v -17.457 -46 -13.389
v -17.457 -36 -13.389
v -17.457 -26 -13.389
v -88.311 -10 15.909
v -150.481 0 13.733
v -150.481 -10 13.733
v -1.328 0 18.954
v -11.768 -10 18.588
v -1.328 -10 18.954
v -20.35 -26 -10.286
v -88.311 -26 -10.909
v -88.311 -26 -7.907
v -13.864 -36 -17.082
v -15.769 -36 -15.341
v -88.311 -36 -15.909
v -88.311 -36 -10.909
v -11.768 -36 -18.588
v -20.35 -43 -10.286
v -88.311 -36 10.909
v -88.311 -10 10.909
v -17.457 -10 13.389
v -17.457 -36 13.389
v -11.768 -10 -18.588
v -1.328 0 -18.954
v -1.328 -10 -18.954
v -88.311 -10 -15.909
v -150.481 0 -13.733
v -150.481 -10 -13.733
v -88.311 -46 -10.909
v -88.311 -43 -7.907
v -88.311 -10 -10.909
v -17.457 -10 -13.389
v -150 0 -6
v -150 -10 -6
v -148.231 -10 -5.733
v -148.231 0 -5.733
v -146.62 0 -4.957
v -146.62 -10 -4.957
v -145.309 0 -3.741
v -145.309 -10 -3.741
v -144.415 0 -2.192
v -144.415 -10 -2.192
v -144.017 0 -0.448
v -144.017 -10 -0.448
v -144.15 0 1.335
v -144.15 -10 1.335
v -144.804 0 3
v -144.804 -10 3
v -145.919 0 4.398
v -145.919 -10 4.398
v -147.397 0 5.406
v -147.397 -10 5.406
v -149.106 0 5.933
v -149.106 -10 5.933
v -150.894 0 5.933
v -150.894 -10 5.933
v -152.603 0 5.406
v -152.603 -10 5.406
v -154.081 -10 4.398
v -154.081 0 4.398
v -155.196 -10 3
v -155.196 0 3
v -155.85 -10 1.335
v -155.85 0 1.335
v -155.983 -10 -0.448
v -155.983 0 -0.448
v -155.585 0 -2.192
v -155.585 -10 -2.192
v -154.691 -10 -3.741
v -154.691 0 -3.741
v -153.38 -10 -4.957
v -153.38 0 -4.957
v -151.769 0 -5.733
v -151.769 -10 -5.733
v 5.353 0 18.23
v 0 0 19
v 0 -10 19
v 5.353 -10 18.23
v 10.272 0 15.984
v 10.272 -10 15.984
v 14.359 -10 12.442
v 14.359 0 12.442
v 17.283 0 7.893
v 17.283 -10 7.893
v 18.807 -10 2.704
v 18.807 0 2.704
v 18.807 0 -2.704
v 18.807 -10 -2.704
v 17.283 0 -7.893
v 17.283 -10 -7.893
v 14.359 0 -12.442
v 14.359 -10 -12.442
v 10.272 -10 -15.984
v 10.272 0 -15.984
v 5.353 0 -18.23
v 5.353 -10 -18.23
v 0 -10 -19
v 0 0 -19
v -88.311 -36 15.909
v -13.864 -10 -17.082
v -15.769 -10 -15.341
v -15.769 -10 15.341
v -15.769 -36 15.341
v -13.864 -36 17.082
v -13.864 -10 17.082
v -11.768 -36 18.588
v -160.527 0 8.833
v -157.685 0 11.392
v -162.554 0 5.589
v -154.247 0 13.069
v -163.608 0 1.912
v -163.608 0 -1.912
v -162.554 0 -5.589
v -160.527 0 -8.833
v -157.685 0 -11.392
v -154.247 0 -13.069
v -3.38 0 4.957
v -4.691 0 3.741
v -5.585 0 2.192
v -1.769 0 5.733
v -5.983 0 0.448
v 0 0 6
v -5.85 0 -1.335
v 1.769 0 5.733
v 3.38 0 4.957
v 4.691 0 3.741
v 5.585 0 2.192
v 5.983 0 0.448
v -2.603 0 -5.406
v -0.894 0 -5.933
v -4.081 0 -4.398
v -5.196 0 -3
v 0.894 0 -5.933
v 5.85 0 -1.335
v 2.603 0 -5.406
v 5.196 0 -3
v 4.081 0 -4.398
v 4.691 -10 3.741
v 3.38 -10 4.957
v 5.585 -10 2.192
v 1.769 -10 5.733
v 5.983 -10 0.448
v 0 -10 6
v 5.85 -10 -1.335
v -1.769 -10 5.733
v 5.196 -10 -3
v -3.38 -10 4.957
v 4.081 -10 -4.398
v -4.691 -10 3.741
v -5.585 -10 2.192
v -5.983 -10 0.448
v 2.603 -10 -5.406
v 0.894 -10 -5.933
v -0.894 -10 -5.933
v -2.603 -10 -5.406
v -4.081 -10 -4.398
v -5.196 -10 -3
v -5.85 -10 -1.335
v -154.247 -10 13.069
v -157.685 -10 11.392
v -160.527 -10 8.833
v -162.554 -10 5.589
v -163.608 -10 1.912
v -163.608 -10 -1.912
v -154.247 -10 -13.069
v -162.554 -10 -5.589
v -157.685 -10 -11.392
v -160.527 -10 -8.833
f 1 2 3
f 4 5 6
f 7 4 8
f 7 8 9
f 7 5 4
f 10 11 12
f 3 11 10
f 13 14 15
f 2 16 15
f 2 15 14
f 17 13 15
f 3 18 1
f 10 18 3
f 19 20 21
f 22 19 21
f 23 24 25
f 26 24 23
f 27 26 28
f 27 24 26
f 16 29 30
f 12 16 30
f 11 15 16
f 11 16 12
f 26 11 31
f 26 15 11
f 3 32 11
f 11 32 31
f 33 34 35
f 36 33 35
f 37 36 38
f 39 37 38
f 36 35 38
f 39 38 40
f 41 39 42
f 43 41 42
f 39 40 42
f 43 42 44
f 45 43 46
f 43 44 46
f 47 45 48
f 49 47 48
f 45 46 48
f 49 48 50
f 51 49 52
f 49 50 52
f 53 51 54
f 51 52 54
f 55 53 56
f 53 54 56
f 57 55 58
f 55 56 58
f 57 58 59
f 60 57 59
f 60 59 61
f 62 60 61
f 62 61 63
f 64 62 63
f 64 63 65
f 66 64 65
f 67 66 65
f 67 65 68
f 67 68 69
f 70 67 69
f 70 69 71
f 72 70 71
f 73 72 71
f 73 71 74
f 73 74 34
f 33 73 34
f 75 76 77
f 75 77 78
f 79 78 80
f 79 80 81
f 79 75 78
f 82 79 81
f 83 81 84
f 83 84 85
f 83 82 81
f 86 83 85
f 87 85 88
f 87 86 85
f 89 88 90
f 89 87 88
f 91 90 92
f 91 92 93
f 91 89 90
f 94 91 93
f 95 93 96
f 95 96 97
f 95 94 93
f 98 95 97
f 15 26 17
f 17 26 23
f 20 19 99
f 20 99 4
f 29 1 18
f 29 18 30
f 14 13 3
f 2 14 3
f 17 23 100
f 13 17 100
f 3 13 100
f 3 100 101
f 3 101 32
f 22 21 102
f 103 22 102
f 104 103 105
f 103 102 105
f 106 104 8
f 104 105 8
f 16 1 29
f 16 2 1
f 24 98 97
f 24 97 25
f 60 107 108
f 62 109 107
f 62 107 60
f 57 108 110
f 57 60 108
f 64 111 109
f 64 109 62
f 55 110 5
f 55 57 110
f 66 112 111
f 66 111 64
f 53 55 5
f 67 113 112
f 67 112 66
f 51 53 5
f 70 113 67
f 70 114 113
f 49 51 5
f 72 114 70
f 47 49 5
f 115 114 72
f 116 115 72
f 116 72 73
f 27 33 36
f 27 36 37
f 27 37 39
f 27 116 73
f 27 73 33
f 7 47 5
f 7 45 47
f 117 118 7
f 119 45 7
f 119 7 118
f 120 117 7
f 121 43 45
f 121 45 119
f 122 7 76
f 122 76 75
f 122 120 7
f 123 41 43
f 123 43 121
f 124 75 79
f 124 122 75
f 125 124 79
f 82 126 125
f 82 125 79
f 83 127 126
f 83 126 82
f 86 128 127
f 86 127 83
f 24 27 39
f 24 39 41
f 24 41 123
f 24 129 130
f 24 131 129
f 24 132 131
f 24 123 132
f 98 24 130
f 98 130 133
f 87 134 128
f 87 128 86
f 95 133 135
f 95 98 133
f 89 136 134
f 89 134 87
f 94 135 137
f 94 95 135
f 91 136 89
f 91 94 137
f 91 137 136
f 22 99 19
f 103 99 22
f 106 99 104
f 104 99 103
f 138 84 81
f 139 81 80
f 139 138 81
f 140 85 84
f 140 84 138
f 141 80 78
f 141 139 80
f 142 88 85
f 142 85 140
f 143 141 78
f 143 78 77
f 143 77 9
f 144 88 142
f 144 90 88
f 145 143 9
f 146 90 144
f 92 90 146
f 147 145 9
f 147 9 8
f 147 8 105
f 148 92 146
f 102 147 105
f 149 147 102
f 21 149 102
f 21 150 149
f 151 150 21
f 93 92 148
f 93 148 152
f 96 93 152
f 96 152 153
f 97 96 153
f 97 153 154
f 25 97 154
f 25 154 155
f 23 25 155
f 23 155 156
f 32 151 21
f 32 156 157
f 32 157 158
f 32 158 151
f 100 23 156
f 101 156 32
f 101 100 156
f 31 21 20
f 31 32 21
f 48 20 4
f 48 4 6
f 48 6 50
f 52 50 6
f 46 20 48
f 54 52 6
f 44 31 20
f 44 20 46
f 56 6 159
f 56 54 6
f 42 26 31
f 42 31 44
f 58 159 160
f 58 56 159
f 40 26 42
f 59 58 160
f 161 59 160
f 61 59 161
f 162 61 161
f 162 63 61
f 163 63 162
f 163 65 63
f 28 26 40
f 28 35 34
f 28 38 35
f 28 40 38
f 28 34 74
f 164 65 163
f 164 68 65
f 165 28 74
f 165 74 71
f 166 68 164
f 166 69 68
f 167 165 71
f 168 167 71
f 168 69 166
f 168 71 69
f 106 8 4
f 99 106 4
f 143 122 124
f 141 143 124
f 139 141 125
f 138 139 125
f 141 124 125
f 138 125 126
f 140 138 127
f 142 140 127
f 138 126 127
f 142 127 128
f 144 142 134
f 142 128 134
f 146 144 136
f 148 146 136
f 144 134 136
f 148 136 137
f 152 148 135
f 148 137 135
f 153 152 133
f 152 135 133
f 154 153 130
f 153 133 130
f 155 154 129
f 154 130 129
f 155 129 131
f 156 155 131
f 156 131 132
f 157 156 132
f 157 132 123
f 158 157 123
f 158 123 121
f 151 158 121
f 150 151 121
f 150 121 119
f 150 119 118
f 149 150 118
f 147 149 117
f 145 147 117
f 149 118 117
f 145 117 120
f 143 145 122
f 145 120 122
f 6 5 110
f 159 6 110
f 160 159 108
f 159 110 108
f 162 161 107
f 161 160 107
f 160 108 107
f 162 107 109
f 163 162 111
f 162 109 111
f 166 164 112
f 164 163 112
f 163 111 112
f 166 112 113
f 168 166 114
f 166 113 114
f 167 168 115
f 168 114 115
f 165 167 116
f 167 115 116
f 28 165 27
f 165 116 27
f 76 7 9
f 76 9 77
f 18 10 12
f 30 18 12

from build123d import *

# Parameters (mm, degrees)
SKETCH1_R               = 12
SKETCH1_R_2             = 6
BOSS_EXTRUDE1_DEPTH     = 10
SKETCH2_R               = 6
SKETCH2_R_2             = 12
BOSS_EXTRUDE3_DEPTH     = 10
BOSS_EXTRUDE4_DEPTH     = 26
CUT_EXTRUDE3_START      = -41
CUT_EXTRUDE3_DEPTH      = 41
CUT_EXTRUDE4_REACH      = 168.878
SKETCH7_R               = 6
SKETCH8_R               = 22
CUT_EXTRUDE5_DEPTH      = 26
BOSS_EXTRUDE5_DEPTH     = 3
CHAMFER1_SIZE           = 3
CUT_EXTRUDE7_DEPTH      = 172.13826848
CUT_EXTRUDE7_DEPTH_BACK = 172.13826848
SKETCH12_W              = 45
SKETCH12_H              = 36


with BuildPart() as part:
    # Sketch1 → Boss-Extrude1 (new body)
    with BuildSketch(Plane(origin=(0, 0, 0), x_dir=(1, 0, 0), z_dir=(0, 1, 0))):
        with Locations(Location((0, 0, 0), (0, 0, 270))):
            Circle(SKETCH1_R)
        with Locations(Location((0, 0, 0), (0, 0, 270))):
            Circle(SKETCH1_R_2, mode=Mode.SUBTRACT)
    extrude(amount=-BOSS_EXTRUDE1_DEPTH)

    # Sketch2 → Boss-Extrude3 (add)
    with BuildSketch(Plane(origin=(0, 0, 0), x_dir=(1, 0, 0), z_dir=(0, 1, 0))):
        with BuildLine():
            Line((-1.328372743, 18.953506954), (-200, 12))
            ThreePointArc((-200, 12), (-212, 0), (-200, -12))
            Line((-200, -12), (-1.328372743, -18.953506954))
            Line((-1.328372743, -18.953506954), (0, -19))
            ThreePointArc((0, -19), (19, 0), (0, 19))
            Line((0, 19), (-1.328372743, 18.953506954))
        make_face()
        with Locations(Location((-200, 0, 0), (0, 0, 270))):
            Circle(SKETCH2_R, mode=Mode.SUBTRACT)
        Circle(SKETCH2_R_2, mode=Mode.SUBTRACT)
    extrude(amount=-BOSS_EXTRUDE3_DEPTH)

    # Sketch3 → Boss-Extrude4 (add)
    with BuildSketch(Plane.XZ.offset(10)):
        with BuildLine():
            Line((-191.415216863, -12.30046741), (-11.76781879, -18.588126342))
            ThreePointArc((-11.76781879, -18.588126342), (-14.841660941, -16.239615159), (-17.45663787, -13.389017675))
            Line((-17.45663787, -13.389017675), (-186.984061419, -7.45555785))
            ThreePointArc((-186.984061419, -7.45555785), (-188.93130171, -10.123434109), (-191.415216863, -12.30046741))
        make_face()
        with BuildLine():
            Line((-186.984061419, 7.45555785), (-17.45663787, 13.389017675))
            ThreePointArc((-17.45663787, 13.389017675), (-14.841660941, 16.239615159), (-11.76781879, 18.588126342))
            Line((-11.76781879, 18.588126342), (-191.415216863, 12.30046741))
            ThreePointArc((-191.415216863, 12.30046741), (-188.93130171, 10.123434109), (-186.984061419, 7.45555785))
        make_face()
    extrude(amount=BOSS_EXTRUDE4_DEPTH)

    # Sketch6 → Cut-Extrude3 (cut)
    with BuildSketch(Plane.XZ.offset(36).offset(CUT_EXTRUDE3_START)):
        with BuildLine():
            Line((-200, 12), (-191.415216863, 12.30046741))
            Line((-191.415216863, 12.30046741), (-150.48066119, 13.733176858))
            ThreePointArc((-150.48066119, 13.733176858), (-163.741585855, 0), (-150.48066119, -13.733176858))
            Line((-150.48066119, -13.733176858), (-191.415216863, -12.30046741))
            Line((-191.415216863, -12.30046741), (-200, -12))
            ThreePointArc((-200, -12), (-212, 0), (-200, 12))
        make_face()
    extrude(amount=CUT_EXTRUDE3_DEPTH, mode=Mode.SUBTRACT)

    # Sketch7 → Cut-Extrude4 (cut, up to next)
    with BuildSketch(Plane.XZ.offset(10), mode=Mode.PRIVATE) as cut_extrude4_sk1:
        with Locations(Location((-150, 0, 0), (0, 0, 270))):
            Circle(SKETCH7_R)
    cut_extrude4_tool1 = extrude(cut_extrude4_sk1.sketch, amount=-CUT_EXTRUDE4_REACH, mode=Mode.PRIVATE) & part.part
    add(cut_extrude4_tool1.solids().sort_by_distance((-150, -10, 0))[0], mode=Mode.SUBTRACT)

    # Sketch8 → Cut-Extrude5 (cut)
    with BuildSketch(Plane(origin=(0, -36, 0), x_dir=(-1, 0, 0), z_dir=(0, -1, 0))):
        with Locations((150, 0)):
            Circle(SKETCH8_R)
    extrude(amount=-CUT_EXTRUDE5_DEPTH, mode=Mode.SUBTRACT)

    # Sketch10 → Boss-Extrude5 (add)
    with BuildSketch(Plane(origin=(-0.489400484, 0, -13.982870983), x_dir=(0.999388062160532, 0, -0.03497858217562234), z_dir=(0.03497858217562234, 0, 0.9993880621605321))):
        Polygon((-128.434604534, -26), (-16.977626637, -26), (-16.977626637, -36), (-16.977626637, -46), (-128.434604534, -46), align=None)
    extrude(amount=BOSS_EXTRUDE5_DEPTH)

    # Chamfer1
    chamfer1_edges = [part.edges().sort_by_distance(p)[0] for p in [
        (-17.351702123, -36, -10.390853488),
        (-73.0460887, -46, -8.441549958),
        (-128.740475277, -36, -6.492246428),
    ]]
    chamfer(chamfer1_edges, length=CHAMFER1_SIZE - 0.0001)  # a hair under: the kernel refuses the full size

    # Sketch12 → Cut-Extrude7 (cut, two sides: drawn at the far end of the back side and taken through both)
    with BuildSketch(Plane.XY.offset(-CUT_EXTRUDE7_DEPTH_BACK)):
        with Locations((-110.810696752, -28)):
            Rectangle(SKETCH12_W, SKETCH12_H)
    extrude(amount=CUT_EXTRUDE7_DEPTH + CUT_EXTRUDE7_DEPTH_BACK, mode=Mode.SUBTRACT)


solid = part.part
